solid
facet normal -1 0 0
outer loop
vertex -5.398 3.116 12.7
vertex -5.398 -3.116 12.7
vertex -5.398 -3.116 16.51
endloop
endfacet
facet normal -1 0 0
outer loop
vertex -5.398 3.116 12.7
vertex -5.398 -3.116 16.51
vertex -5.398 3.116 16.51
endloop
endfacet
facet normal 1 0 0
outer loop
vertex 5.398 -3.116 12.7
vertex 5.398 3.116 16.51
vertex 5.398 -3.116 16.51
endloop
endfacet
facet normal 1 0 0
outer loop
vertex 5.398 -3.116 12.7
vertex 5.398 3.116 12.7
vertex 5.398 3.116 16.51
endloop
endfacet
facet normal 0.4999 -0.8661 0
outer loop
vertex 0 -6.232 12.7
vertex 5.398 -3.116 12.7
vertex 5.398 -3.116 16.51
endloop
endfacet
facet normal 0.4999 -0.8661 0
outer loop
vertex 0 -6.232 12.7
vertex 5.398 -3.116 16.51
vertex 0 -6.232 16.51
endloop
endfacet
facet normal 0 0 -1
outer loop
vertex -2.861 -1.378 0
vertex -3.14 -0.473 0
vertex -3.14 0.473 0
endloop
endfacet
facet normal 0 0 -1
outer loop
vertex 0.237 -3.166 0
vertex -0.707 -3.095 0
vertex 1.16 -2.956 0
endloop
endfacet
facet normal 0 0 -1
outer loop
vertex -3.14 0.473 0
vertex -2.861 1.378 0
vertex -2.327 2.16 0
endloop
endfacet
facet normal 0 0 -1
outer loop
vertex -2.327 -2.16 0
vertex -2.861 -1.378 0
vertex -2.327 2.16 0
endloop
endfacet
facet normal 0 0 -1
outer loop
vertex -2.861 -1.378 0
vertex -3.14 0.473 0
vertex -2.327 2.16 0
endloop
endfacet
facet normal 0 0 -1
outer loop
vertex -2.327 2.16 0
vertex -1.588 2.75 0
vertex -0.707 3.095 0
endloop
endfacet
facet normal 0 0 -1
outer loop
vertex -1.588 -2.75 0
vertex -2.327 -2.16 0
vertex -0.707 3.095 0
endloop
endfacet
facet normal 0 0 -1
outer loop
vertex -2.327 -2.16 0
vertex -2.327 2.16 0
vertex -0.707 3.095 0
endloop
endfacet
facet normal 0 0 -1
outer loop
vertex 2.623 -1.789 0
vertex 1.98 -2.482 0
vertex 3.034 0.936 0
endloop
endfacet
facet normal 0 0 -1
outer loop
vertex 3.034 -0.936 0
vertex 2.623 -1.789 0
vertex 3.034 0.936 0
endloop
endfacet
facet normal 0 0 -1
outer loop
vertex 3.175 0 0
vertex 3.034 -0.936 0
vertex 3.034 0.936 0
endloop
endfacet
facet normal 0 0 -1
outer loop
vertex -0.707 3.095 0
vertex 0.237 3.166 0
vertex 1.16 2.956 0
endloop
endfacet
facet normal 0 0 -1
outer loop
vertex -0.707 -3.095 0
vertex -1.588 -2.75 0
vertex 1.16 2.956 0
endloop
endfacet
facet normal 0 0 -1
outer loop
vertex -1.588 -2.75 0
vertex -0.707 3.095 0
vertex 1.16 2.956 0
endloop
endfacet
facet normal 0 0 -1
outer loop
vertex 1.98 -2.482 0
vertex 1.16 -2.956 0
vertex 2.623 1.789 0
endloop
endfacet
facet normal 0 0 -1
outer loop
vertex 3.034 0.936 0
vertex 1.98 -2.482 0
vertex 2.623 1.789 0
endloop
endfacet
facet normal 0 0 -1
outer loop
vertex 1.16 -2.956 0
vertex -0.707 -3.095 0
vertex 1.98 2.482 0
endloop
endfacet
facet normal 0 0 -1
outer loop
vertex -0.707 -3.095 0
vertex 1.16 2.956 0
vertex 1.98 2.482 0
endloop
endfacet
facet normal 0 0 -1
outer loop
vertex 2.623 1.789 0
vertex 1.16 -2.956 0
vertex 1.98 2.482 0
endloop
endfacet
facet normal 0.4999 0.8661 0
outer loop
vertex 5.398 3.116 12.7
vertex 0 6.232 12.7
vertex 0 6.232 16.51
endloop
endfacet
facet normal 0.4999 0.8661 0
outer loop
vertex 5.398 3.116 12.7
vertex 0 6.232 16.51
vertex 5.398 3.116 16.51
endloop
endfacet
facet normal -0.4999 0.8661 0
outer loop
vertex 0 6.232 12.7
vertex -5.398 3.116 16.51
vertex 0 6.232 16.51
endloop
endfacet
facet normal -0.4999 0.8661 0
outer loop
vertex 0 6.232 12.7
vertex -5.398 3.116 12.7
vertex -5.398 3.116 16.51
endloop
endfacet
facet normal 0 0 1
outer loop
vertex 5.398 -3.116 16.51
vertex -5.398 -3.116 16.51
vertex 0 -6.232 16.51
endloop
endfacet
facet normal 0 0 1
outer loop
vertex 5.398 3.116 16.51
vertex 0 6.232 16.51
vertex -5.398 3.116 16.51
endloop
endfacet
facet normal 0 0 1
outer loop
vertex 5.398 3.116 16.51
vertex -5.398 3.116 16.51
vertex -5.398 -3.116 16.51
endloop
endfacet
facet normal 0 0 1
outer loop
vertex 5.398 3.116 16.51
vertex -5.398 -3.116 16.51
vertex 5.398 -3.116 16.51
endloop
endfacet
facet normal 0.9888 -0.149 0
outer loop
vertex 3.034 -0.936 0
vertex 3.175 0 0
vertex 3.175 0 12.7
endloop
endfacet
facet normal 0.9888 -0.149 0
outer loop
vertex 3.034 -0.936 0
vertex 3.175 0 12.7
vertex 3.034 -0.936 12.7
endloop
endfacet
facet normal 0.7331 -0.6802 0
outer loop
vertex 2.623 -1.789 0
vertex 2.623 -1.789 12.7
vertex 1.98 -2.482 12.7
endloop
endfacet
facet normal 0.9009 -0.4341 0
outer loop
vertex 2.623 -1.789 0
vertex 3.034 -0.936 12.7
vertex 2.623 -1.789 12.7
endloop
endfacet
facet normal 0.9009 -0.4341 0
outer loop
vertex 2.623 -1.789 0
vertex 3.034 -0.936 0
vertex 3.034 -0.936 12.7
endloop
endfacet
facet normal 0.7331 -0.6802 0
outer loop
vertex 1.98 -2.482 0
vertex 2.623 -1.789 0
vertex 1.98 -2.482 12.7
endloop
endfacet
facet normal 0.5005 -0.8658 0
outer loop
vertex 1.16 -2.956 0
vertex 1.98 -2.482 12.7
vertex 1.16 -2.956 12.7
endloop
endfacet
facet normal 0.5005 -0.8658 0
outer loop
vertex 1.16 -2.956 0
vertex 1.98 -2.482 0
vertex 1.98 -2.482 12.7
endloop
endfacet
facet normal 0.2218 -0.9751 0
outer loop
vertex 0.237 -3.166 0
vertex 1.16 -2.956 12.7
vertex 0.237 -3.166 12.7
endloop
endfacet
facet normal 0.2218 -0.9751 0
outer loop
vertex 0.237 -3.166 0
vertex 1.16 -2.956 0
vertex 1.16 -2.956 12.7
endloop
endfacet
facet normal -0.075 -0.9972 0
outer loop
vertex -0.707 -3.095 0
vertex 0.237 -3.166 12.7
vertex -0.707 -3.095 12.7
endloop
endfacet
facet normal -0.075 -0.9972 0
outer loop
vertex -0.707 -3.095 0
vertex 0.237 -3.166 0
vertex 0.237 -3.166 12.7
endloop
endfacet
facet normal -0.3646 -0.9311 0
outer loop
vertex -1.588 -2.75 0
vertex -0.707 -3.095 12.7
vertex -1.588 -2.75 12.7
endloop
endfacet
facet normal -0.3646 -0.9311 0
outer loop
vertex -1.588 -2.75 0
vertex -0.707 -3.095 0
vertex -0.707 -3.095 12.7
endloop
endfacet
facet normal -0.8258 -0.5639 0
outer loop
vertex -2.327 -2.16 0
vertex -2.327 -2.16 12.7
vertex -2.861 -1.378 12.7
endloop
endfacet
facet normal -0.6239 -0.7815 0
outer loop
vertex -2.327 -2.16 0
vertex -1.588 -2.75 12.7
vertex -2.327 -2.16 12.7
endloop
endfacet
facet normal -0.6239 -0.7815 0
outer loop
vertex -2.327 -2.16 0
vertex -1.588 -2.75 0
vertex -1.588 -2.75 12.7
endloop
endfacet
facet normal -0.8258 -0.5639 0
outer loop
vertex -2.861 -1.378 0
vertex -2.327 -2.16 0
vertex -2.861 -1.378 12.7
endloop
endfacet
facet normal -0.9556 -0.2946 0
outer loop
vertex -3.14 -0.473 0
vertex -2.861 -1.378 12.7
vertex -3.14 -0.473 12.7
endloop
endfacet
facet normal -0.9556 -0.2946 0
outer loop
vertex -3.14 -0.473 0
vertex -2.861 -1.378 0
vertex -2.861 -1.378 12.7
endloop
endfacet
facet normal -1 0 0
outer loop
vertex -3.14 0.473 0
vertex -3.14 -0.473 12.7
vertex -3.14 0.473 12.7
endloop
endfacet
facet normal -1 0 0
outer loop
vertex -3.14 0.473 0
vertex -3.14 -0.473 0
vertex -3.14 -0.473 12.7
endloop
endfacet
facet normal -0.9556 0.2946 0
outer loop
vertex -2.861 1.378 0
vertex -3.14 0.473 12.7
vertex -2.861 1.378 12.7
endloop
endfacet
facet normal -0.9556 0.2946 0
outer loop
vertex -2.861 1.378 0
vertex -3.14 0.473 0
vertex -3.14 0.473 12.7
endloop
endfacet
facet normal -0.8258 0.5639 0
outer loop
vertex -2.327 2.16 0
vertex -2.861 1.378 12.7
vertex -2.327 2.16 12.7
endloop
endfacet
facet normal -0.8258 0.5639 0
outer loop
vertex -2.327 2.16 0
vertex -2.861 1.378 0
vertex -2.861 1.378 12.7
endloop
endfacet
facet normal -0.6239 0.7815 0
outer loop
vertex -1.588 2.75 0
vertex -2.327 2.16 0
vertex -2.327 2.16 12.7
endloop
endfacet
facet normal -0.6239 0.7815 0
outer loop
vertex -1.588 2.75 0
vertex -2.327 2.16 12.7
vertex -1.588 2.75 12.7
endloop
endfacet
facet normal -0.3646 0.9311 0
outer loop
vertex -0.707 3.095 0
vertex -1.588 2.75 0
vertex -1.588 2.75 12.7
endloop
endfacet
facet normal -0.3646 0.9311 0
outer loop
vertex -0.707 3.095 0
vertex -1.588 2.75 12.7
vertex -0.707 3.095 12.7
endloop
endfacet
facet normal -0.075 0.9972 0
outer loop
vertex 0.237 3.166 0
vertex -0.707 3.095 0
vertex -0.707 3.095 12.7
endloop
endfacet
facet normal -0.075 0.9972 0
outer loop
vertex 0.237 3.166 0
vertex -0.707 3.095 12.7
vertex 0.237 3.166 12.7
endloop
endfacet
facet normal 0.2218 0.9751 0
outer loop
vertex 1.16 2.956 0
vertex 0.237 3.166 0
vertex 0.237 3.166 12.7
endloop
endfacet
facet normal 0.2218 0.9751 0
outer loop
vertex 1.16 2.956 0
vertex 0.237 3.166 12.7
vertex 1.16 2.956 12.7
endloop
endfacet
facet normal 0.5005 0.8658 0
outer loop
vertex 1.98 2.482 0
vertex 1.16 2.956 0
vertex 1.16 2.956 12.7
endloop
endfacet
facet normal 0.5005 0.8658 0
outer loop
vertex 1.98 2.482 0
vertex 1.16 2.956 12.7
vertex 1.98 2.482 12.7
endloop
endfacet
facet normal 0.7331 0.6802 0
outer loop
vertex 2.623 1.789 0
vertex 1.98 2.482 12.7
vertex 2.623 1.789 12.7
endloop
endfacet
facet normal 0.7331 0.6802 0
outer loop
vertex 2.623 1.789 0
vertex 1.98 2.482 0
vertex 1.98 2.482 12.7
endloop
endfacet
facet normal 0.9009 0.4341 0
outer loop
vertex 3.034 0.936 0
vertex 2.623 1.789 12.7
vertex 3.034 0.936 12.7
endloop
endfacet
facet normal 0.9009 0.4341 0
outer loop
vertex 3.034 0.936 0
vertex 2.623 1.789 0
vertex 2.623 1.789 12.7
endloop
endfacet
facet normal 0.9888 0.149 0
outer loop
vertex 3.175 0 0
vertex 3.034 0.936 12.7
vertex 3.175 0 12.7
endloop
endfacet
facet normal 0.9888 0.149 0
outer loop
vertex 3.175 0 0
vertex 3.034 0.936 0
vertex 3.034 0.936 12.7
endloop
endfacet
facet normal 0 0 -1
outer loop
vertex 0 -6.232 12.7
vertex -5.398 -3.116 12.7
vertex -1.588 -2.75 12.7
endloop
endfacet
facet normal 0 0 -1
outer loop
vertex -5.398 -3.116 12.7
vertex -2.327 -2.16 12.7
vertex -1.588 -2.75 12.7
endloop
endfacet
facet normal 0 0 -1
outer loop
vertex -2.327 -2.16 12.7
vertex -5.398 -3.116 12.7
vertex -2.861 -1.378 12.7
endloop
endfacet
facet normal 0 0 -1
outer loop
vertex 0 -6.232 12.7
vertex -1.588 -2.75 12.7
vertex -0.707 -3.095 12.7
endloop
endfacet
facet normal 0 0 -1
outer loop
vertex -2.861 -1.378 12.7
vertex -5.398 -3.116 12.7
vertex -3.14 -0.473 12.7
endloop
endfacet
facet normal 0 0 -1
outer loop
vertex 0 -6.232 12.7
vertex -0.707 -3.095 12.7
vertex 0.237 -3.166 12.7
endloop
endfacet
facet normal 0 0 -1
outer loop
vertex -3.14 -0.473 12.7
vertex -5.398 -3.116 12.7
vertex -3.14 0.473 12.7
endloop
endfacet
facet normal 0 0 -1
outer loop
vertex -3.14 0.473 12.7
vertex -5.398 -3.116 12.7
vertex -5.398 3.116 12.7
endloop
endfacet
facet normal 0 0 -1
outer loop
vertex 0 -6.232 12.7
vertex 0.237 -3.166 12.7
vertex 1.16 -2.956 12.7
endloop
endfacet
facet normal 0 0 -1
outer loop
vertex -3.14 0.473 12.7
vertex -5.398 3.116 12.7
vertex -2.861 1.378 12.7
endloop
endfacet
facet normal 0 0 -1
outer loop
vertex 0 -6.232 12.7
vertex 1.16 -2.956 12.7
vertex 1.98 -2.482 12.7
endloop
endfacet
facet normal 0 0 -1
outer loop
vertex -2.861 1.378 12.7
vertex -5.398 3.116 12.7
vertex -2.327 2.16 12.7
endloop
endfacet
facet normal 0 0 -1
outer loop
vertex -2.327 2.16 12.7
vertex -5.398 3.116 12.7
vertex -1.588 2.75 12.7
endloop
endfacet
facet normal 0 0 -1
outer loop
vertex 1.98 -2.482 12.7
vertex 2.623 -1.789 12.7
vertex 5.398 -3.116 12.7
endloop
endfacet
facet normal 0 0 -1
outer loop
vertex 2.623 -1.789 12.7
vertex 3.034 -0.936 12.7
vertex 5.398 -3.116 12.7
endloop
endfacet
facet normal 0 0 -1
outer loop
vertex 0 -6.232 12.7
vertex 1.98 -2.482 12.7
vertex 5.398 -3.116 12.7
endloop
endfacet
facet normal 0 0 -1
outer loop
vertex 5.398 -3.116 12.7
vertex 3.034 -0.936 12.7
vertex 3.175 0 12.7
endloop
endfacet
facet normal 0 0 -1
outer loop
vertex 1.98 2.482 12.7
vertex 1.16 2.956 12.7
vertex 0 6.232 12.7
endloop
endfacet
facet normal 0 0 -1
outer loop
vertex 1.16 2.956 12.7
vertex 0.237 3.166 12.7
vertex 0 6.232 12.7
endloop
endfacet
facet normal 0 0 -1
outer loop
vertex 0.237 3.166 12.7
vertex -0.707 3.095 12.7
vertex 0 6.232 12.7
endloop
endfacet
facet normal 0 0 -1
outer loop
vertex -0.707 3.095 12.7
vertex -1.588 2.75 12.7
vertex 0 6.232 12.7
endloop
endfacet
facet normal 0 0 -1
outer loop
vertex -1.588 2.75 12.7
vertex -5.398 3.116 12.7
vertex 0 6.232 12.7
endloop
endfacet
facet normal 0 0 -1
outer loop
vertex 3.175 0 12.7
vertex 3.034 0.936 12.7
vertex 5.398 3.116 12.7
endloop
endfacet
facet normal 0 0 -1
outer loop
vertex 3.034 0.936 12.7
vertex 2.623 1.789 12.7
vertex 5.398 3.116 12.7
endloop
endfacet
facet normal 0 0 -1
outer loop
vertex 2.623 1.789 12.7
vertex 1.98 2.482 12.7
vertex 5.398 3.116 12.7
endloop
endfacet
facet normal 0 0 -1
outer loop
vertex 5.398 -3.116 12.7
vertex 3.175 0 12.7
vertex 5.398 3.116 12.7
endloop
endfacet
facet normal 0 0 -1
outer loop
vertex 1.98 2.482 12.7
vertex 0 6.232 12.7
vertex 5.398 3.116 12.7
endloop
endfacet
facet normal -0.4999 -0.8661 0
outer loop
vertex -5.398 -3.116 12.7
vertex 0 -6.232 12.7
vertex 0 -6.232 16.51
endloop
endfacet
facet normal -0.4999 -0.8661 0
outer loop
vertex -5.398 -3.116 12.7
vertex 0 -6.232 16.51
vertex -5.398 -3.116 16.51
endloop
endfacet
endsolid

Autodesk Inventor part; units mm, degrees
ref_plane "YZ Plane" through (0, 0, 0) normal (1, 0, 0) x (0, 1, 0)
ref_plane "XZ Plane" through (0, 0, 0) normal (0, 1, 0) x (-1, 0, 0)
ref_plane "XY Plane" through (0, 0, 0) normal (0, 0, 1) x (1, 0, 0)
sketch "Sketch1" plane through (0, 0, 0) normal (0, 0, 1) x (1, 0, 0)
  circle A0 centre (0, 0) radius 3.175
  dimension "d0" = 6.35
extrude "Extrusion1" add sketch "Sketch1" along normal blind 12.7
sketch "Sketch2" plane through (0, 0, 12.7) normal (0, 0, 1) x (1, 0, 0)
  circle A0 centre (0, 0) radius 3.175 projected
  line L0 (0, 6.2325) -> (5.3975, 3.1162)
  line L1 (5.3975, 3.1162) -> (5.3975, -3.1162)
  line L2 (5.3975, -3.1162) -> (0, -6.2325)
  line L3 (0, -6.2325) -> (-5.3975, -3.1162)
  line L4 (-5.3975, -3.1162) -> (-5.3975, 3.1162)
  line L5 (-5.3975, 3.1162) -> (0, 6.2325)
  dimension "d3" = 10.795
extrude "Extrusion2" add sketch "Sketch2" along normal blind 3.81 contours A0 | L0 L1 L2 L3 L4 L5
thread "Thread1" size "1/4-20 UNC" class "2A" standard "ANSI Unified Screw Threads" full length
properties part number "Bolt .5 1764"
